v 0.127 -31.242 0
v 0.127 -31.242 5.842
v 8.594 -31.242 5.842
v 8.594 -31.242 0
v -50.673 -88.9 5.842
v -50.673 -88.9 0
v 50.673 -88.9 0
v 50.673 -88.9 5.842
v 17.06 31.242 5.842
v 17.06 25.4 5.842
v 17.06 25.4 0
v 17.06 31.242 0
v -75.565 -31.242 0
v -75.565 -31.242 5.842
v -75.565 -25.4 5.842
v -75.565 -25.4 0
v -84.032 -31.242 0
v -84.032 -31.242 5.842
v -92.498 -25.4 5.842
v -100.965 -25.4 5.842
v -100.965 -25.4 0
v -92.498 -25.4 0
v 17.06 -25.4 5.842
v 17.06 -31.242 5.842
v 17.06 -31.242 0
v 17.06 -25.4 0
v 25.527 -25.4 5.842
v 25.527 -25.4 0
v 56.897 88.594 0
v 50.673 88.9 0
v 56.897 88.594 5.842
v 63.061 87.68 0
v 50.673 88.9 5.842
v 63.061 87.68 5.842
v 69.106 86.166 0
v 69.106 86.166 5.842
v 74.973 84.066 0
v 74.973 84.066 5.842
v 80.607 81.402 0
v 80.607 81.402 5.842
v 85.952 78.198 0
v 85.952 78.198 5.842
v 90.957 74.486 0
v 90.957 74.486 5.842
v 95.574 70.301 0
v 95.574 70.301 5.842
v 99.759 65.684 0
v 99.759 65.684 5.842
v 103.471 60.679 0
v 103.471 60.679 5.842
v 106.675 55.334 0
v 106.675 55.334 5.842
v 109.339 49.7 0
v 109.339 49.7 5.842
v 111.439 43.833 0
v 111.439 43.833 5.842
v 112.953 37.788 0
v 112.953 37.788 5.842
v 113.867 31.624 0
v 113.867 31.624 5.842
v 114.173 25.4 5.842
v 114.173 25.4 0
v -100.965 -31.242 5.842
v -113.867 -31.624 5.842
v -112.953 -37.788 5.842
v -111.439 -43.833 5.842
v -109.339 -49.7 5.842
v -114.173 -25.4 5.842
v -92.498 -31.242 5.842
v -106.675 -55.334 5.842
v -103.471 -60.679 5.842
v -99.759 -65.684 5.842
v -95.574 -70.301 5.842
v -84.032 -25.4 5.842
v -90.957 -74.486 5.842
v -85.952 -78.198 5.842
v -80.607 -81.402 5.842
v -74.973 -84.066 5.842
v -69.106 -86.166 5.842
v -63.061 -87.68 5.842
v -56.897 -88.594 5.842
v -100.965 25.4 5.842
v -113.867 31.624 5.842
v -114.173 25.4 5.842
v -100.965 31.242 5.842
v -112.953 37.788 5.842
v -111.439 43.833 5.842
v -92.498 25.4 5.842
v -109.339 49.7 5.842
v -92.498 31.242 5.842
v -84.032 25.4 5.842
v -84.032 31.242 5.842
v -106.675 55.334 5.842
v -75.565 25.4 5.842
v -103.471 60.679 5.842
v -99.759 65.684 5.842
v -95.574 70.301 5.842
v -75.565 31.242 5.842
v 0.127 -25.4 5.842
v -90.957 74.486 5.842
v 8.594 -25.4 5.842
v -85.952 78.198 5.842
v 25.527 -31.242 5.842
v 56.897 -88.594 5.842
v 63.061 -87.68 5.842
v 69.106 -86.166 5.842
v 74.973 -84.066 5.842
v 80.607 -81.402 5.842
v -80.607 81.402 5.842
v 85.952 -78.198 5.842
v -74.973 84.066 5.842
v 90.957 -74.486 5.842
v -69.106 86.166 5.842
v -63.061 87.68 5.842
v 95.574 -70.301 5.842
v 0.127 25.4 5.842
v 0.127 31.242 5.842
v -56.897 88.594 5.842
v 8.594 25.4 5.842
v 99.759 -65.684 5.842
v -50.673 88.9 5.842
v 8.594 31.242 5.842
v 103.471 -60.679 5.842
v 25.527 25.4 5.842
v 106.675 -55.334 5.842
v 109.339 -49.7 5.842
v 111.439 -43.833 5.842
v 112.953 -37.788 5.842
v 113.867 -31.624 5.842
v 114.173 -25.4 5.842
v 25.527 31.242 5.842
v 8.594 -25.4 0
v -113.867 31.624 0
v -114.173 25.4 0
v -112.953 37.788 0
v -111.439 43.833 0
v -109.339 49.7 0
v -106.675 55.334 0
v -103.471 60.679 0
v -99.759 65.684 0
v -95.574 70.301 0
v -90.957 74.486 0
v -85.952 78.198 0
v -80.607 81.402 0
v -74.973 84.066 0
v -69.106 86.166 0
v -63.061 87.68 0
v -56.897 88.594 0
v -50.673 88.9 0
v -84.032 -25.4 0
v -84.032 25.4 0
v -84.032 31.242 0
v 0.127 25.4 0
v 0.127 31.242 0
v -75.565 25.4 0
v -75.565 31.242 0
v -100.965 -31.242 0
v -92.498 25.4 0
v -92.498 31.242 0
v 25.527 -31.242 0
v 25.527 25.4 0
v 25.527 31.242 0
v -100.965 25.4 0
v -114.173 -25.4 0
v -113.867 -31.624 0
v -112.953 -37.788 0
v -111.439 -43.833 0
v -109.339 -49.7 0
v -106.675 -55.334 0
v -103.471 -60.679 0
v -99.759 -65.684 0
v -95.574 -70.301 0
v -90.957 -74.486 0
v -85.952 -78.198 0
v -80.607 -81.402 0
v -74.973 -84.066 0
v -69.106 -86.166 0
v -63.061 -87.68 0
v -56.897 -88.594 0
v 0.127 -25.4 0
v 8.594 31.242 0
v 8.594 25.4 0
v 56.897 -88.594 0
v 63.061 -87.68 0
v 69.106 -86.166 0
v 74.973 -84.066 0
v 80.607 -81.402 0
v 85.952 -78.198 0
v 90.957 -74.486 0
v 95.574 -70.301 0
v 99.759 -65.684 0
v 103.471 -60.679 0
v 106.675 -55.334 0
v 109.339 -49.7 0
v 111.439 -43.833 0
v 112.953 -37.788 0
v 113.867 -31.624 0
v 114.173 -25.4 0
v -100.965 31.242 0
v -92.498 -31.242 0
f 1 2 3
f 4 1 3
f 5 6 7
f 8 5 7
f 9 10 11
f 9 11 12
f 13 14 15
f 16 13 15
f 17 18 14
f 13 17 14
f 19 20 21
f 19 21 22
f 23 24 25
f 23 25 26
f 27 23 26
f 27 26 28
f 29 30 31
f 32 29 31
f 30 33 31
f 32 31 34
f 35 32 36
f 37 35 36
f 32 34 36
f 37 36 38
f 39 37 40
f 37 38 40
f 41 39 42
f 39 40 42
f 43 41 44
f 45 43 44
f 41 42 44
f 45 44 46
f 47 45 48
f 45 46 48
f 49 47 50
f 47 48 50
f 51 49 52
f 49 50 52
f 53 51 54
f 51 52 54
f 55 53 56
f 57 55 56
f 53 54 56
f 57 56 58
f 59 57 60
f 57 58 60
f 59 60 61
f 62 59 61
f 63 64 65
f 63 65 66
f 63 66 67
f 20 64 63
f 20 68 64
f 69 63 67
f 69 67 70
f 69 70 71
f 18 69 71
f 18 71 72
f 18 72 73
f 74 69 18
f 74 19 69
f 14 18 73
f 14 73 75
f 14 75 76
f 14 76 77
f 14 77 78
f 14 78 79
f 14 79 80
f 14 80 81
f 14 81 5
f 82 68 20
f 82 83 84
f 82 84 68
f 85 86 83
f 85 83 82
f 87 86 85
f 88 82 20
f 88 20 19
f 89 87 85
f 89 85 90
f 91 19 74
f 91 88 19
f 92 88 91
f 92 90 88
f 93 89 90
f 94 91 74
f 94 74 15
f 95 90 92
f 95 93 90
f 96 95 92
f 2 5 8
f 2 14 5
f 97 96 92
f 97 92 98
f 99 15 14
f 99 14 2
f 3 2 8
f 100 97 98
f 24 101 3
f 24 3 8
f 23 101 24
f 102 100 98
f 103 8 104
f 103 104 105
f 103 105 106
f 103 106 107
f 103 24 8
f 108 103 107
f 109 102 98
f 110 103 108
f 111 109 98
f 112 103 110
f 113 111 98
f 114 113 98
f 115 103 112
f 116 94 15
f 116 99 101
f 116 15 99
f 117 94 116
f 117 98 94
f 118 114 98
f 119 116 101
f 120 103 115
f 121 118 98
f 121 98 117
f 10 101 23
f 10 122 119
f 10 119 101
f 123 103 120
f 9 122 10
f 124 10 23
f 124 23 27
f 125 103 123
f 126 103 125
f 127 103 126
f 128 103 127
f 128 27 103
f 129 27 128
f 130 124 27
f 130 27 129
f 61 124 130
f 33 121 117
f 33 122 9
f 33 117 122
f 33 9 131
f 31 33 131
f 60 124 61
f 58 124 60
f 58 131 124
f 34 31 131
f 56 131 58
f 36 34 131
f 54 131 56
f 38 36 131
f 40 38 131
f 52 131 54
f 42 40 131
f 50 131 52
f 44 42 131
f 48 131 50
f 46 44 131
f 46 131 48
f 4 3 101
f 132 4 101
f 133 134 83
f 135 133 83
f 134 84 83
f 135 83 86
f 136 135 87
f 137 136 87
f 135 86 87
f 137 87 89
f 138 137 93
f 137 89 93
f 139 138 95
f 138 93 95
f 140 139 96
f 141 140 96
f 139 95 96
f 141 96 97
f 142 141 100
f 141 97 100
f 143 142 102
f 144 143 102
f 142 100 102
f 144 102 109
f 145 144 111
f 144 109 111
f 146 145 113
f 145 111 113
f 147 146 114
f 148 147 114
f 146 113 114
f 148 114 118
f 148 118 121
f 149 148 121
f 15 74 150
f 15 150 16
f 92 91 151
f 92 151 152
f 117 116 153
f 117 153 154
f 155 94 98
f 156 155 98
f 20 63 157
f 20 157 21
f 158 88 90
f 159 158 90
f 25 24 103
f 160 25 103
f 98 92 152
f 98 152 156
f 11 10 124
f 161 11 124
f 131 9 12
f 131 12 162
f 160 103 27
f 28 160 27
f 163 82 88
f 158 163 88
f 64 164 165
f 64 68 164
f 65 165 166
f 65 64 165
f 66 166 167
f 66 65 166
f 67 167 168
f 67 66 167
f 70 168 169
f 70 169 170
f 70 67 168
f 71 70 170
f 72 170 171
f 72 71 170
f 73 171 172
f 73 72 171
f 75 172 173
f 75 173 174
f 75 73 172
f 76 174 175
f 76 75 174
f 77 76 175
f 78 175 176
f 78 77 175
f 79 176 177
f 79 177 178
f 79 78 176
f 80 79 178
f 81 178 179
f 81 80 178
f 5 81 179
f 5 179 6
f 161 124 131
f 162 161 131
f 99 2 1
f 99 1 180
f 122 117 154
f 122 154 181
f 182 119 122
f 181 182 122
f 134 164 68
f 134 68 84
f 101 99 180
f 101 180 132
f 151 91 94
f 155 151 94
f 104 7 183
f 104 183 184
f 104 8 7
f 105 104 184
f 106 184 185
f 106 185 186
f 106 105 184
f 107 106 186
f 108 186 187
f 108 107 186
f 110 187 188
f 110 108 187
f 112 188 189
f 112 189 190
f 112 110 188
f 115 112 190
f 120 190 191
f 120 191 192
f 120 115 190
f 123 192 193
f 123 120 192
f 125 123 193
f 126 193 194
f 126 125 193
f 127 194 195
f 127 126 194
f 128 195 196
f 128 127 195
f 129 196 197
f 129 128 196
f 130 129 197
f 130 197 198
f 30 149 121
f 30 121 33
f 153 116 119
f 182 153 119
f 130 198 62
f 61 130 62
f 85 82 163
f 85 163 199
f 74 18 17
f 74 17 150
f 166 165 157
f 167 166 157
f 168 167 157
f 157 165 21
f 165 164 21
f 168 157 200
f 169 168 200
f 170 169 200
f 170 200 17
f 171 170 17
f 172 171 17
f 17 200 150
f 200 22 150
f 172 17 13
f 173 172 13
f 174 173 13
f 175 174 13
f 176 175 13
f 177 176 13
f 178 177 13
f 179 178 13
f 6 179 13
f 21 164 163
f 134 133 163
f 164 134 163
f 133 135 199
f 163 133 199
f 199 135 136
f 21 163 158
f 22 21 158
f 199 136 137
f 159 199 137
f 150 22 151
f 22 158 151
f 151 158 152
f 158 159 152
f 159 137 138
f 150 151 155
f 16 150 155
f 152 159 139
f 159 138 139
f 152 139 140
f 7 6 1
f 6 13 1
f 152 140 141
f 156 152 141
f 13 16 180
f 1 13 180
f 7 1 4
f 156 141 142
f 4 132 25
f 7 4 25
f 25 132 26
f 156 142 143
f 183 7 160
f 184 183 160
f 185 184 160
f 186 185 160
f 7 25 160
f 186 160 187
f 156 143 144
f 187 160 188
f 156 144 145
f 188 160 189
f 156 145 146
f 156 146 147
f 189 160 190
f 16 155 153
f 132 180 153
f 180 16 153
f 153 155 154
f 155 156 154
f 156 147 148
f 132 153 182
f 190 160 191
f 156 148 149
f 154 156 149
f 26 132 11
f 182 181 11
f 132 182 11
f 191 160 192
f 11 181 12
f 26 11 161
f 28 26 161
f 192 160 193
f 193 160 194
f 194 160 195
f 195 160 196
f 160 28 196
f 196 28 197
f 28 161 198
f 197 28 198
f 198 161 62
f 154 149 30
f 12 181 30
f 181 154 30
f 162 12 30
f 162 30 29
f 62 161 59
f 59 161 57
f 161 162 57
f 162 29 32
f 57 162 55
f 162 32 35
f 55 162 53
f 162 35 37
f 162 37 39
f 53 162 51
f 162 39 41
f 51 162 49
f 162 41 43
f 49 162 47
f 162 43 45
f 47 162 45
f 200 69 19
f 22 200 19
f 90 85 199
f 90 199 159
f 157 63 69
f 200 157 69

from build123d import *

# Parameters (mm, degrees)
SKETCH1_W           = 228.346
SKETCH1_H           = 177.8
BOSS_EXTRUDE1_DEPTH = 5.842
FILLET1_R           = 63.5
FILLET2_R           = 63.5
FILLET3_R           = 63.5
SKETCH2_W           = 8.466666667
SKETCH2_H           = 5.842
CUT_EXTRUDE1_DEPTH  = 145.819932651


with BuildPart() as part:
    # Sketch1 → Boss-Extrude1 (new body)
    with BuildSketch(Plane.XY):
        Rectangle(SKETCH1_W, SKETCH1_H)
    extrude(amount=BOSS_EXTRUDE1_DEPTH)

    # Fillet1
    fillet1_edges = [part.edges().sort_by_distance(p)[0] for p in [
        (-114.173, 88.9, 2.921),
    ]]
    fillet(fillet1_edges, radius=FILLET1_R)

    # Fillet2
    fillet2_edges = [part.edges().sort_by_distance(p)[0] for p in [
        (-114.173, -88.9, 2.921),
    ]]
    fillet(fillet2_edges, radius=FILLET2_R)

    # Fillet3
    fillet3_edges = [part.edges().sort_by_distance(p)[0] for p in [
        (114.173, 88.9, 2.921),
        (114.173, -88.9, 2.921),
    ]]
    fillet(fillet3_edges, radius=FILLET3_R)

    # Sketch2 → Cut-Extrude1 (cut, through all)
    with BuildSketch(Plane.XY.offset(5.842)):
        with Locations((4.360333334, -28.321)):
            Rectangle(SKETCH2_W, SKETCH2_H)
        with Locations((21.293666667, -28.321)):
            Rectangle(SKETCH2_W, SKETCH2_H)
        with Locations((4.360333334, 28.321)):
            Rectangle(SKETCH2_W, SKETCH2_H)
        with Locations((21.293666667, 28.321)):
            Rectangle(SKETCH2_W, SKETCH2_H)
        with Locations((-96.731666667, -28.321)):
            Rectangle(SKETCH2_W, SKETCH2_H)
        with Locations((-79.798333334, -28.321)):
            Rectangle(SKETCH2_W, SKETCH2_H)
        with Locations((-96.731666667, 28.321)):
            Rectangle(SKETCH2_W, SKETCH2_H)
        with Locations((-79.798333334, 28.321)):
            Rectangle(SKETCH2_W, SKETCH2_H)
    extrude(amount=-CUT_EXTRUDE1_DEPTH, mode=Mode.SUBTRACT)


solid = part.part
